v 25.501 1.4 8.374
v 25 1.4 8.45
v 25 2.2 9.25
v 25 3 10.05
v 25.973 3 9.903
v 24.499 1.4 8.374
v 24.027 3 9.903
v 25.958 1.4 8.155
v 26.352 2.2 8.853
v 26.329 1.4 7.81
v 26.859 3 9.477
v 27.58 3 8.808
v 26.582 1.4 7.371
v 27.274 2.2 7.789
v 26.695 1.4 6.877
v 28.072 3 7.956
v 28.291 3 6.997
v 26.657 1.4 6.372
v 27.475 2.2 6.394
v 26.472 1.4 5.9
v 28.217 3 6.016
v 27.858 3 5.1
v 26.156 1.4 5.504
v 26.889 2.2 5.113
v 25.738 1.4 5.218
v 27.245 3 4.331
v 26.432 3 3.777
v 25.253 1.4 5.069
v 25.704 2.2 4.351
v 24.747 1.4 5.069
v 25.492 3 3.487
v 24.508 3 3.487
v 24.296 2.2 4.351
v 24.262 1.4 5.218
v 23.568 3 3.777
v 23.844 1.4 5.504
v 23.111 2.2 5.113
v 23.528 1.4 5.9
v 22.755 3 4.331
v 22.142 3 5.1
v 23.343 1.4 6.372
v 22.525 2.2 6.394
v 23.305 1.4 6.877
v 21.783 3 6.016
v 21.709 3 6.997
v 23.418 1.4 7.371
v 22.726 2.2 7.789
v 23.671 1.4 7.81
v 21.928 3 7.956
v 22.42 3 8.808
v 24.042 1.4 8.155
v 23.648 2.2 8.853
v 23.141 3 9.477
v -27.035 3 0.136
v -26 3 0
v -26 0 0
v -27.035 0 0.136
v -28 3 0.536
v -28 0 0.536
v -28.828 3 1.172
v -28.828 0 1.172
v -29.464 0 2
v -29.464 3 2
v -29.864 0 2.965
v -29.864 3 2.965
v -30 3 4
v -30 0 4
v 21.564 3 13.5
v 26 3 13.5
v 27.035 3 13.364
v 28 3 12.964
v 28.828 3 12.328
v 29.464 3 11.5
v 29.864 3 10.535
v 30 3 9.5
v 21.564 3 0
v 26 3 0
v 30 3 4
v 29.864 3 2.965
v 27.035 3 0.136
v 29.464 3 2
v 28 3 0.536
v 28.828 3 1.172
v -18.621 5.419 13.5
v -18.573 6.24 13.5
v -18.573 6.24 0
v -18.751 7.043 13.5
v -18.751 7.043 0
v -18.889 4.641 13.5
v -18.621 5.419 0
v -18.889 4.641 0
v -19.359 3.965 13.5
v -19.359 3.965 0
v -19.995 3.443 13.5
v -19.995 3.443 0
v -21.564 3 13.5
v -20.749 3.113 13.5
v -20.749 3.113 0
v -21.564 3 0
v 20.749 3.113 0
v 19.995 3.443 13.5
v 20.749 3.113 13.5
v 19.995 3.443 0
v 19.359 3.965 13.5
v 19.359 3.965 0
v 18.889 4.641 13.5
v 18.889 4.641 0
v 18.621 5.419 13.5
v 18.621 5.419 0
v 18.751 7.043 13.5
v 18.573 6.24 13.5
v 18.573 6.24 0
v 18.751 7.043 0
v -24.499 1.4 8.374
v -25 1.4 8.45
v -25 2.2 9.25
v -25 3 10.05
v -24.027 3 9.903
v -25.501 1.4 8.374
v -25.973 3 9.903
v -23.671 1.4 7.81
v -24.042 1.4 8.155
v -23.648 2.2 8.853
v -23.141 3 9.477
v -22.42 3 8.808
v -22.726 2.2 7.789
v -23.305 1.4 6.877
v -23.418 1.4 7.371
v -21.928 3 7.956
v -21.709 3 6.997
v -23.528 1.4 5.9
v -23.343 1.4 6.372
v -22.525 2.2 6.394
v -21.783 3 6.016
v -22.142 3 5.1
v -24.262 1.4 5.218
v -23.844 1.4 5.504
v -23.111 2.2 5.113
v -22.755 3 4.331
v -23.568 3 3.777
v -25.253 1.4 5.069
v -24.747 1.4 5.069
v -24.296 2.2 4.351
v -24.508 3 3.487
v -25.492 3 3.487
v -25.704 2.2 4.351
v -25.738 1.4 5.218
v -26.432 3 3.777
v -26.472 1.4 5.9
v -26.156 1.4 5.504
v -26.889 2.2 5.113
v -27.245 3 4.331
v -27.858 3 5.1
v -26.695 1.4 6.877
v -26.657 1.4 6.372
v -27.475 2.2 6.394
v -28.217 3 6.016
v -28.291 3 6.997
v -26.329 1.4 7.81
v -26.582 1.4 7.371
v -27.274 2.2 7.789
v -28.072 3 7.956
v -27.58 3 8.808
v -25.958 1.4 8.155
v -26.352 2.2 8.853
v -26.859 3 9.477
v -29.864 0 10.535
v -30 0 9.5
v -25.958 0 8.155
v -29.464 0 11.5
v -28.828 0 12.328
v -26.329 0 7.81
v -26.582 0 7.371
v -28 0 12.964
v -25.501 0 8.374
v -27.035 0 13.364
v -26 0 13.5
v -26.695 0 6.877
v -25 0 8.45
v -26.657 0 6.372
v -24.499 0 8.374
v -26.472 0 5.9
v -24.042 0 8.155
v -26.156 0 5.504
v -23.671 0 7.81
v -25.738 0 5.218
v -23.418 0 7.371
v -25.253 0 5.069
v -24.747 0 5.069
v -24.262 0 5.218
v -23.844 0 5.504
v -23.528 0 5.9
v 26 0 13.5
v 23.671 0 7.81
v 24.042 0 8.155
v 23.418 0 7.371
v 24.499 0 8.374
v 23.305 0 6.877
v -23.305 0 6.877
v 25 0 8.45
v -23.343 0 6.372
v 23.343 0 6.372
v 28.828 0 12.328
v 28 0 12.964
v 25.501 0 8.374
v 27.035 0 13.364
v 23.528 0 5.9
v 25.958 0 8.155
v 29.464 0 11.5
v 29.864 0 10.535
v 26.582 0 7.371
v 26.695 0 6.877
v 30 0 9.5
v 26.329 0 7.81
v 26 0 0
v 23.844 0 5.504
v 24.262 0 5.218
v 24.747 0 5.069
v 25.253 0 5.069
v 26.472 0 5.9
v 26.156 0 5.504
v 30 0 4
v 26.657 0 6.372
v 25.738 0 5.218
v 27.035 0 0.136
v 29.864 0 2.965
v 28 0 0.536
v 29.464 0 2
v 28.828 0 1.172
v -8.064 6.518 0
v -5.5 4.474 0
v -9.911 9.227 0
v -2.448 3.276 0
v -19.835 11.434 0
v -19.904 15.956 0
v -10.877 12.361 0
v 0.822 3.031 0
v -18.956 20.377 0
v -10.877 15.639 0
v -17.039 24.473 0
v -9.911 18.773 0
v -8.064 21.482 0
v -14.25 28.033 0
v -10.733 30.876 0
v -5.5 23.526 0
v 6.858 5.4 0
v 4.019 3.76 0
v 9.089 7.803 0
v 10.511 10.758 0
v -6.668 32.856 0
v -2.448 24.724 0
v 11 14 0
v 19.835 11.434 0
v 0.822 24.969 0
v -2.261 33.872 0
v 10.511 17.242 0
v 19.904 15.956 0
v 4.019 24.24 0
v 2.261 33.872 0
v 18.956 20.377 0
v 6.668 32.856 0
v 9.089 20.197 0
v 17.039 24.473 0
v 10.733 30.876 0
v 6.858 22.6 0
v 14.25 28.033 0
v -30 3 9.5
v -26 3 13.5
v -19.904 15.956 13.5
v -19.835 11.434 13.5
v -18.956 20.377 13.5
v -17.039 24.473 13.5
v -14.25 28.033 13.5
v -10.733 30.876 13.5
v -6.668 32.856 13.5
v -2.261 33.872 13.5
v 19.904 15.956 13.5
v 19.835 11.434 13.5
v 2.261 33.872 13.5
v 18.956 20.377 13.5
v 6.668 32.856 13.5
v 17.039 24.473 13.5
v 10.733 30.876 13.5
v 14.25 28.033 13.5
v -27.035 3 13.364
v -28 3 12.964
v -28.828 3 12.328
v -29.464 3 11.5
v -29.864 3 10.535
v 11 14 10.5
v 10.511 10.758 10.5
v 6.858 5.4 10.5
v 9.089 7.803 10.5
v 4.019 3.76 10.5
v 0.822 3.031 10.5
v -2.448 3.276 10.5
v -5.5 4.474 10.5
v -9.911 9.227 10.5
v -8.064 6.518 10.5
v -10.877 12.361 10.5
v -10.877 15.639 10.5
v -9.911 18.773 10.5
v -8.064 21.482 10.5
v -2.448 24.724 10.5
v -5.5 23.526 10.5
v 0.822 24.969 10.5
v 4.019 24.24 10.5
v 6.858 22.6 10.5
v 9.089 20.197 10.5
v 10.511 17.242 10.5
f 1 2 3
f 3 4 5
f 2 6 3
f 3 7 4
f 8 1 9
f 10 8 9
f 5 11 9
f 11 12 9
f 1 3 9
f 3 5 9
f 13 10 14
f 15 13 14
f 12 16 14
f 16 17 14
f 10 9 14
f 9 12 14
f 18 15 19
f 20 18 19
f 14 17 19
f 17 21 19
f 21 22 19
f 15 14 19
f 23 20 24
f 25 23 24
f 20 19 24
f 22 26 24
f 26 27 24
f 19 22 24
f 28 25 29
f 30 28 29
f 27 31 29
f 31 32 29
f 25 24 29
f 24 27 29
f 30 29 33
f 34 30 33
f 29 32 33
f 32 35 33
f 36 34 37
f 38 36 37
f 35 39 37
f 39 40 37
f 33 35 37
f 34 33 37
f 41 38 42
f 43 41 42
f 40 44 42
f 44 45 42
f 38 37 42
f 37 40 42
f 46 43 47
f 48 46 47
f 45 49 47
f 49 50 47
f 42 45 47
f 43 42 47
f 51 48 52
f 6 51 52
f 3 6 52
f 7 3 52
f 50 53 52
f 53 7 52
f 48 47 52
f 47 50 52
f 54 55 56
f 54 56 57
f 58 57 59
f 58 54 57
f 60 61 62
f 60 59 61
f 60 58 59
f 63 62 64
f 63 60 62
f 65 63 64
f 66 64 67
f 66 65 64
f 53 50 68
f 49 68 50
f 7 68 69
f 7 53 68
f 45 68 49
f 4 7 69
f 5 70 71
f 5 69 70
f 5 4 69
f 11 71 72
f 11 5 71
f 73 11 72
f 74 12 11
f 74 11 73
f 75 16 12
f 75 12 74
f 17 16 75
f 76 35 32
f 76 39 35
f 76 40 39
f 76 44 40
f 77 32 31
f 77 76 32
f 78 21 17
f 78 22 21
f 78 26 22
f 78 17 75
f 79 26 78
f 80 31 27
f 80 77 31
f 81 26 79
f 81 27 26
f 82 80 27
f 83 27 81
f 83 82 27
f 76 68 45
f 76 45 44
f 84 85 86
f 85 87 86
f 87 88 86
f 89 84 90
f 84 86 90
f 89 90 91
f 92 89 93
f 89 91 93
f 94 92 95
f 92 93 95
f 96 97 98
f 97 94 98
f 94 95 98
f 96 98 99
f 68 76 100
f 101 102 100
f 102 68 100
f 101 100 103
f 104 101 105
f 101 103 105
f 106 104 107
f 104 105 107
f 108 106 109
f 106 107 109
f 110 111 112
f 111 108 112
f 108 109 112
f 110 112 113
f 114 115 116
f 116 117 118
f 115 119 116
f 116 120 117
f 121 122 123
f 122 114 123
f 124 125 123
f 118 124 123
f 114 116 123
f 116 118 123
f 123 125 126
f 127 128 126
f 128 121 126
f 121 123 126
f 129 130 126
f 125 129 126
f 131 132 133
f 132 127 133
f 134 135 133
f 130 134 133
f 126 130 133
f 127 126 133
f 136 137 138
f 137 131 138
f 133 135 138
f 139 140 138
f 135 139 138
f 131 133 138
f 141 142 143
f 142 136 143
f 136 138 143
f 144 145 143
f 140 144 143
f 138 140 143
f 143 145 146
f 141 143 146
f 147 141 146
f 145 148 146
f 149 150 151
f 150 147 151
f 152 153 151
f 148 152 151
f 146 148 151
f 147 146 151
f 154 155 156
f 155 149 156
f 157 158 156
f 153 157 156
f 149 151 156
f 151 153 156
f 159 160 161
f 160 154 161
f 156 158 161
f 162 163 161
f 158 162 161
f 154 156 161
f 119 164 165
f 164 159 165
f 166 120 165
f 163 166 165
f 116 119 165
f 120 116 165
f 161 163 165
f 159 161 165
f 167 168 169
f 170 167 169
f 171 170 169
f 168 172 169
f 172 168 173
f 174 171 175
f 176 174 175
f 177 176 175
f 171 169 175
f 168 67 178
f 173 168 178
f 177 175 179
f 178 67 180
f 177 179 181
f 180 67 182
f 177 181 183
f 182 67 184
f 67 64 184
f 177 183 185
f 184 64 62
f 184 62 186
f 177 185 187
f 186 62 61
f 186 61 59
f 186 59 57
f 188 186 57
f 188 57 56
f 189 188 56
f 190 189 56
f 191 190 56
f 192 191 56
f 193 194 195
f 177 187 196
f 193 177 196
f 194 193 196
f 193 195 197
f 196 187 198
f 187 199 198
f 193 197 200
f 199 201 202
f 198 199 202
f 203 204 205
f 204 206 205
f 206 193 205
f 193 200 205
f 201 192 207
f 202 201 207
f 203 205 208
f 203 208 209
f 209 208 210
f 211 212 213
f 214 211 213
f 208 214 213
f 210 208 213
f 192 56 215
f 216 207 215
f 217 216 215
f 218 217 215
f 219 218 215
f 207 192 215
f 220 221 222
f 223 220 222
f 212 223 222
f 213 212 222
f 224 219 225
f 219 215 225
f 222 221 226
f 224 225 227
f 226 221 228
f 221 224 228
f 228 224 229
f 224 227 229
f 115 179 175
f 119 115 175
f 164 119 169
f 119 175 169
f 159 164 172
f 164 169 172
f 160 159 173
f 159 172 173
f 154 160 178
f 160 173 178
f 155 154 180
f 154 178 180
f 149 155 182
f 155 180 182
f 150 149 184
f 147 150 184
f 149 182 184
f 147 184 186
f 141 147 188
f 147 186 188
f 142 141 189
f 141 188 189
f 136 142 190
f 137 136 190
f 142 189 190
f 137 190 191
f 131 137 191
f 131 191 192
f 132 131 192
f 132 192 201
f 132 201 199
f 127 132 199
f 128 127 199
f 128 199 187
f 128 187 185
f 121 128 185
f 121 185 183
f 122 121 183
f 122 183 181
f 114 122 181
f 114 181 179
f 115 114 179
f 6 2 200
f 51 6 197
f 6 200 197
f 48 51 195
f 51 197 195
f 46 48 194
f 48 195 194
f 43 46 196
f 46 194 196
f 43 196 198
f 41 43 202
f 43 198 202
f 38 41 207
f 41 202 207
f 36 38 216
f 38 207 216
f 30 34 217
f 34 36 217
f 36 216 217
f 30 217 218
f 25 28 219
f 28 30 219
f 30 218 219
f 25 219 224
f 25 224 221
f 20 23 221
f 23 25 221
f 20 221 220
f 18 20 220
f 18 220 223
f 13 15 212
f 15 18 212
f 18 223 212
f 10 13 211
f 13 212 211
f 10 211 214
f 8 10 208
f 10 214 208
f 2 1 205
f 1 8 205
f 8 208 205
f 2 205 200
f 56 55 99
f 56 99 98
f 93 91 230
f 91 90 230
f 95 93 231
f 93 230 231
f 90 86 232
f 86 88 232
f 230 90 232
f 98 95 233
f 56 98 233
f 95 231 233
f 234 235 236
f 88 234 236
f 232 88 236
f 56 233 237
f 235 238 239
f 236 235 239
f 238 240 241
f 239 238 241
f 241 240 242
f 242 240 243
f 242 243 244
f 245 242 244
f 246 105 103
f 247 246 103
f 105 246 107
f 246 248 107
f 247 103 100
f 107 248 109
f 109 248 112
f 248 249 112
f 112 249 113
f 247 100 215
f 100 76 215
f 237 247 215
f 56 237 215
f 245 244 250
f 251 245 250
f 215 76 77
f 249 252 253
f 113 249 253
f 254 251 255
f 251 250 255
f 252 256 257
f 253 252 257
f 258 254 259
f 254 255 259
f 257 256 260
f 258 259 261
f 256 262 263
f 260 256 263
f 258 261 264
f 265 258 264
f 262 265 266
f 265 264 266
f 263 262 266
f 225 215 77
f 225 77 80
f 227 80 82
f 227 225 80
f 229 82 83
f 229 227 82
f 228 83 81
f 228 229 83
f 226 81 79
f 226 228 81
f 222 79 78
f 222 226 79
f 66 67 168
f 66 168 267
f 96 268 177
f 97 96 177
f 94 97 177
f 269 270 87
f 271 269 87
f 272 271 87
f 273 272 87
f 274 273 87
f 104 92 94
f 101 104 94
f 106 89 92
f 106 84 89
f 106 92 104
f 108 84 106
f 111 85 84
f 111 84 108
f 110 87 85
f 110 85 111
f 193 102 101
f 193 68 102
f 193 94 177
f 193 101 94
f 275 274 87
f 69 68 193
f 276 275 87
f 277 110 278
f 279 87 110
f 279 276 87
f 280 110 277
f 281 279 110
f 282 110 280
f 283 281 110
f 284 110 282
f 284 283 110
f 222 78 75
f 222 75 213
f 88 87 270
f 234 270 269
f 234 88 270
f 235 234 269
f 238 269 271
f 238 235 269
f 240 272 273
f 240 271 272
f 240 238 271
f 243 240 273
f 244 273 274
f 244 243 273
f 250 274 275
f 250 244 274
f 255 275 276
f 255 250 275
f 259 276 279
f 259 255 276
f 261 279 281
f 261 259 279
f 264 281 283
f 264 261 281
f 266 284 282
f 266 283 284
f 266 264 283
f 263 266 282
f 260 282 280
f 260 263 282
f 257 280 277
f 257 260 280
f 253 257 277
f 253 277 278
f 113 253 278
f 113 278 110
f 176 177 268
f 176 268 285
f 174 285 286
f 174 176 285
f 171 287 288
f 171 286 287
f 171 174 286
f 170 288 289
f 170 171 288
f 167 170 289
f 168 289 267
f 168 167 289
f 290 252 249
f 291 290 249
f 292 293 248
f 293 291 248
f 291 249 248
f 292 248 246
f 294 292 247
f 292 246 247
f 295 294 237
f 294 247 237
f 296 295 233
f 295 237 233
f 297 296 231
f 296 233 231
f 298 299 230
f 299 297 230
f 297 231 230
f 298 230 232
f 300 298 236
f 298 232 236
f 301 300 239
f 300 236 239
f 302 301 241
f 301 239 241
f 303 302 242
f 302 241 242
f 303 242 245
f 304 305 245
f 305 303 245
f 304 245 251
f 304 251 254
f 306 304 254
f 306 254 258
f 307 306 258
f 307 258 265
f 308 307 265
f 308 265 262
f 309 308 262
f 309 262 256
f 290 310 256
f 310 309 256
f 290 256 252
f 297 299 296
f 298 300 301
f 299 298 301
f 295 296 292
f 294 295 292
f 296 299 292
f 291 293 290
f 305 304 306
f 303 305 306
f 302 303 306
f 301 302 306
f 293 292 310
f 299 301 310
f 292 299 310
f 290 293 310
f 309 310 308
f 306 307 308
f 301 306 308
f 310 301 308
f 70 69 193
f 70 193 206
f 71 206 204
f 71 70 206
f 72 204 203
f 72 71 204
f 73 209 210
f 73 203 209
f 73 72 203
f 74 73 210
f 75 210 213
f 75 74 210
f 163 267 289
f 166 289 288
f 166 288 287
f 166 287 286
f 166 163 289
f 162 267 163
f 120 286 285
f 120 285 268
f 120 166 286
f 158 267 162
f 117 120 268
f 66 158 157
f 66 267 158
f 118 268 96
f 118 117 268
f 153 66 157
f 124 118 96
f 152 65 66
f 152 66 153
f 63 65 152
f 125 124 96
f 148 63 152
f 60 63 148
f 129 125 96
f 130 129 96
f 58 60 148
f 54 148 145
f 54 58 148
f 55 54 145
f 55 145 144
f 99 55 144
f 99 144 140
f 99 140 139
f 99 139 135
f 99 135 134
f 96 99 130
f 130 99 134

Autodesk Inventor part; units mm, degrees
ref_plane "YZ Plane" through (0, 0, 0) normal (1, 0, 0) x (0, 1, 0)
ref_plane "XZ Plane" through (0, 0, 0) normal (0, 1, 0) x (-1, 0, 0)
ref_plane "XY Plane" through (0, 0, 0) normal (0, 0, 1) x (1, 0, 0)
sketch "Эскиз1" plane through (0, 0, 0) normal (0, 0, 1) x (1, 0, 0)
  line L0 (-30, 0) -> (30, 0)
  line L1 (-30, 0) -> (-30, 3)
  line L2 (-30, 3) -> (-16.7033, 3)
  line L3 (16.7033, 3) -> (30, 3)
  line L4 (30, 3) -> (30, 0)
  line L5 (0, 0) -> (0, -12) construction
  circle A0 centre (0, 14) radius 11 construction
  circle A1 centre (0, 14) radius 11
  arc A2 (16.7033, 3) -> (-16.7033, 3) centre (0, 14) ccw
  point P0 (0, 3)
  point P1 (0, 46)
  point P2 (0, 25)
  dimension "d3" = 3
  dimension "d8" = 22
  dimension "d9" = 14
  dimension "d25" = 40
  dimension "d39" = 30
extrude "Выдавливание1" add sketch "Эскиз1" along normal blind 10.5
sketch "Эскиз2" plane through (0, 0, 10.5) normal (0, 0, 1) x (1, 0, 0)
  line L0 (-30, 0) -> (30, 0) projected
  line L1 (30, 0) -> (30, 3) projected
  line L2 (30, 3) -> (16.7033, 3) projected
  line L3 (-16.7033, 3) -> (-30, 3) projected
  line L4 (-30, 3) -> (-30, 0) projected
  circle A0 centre (0, 14) radius 11 projected
  arc A1 (16.7033, 3) -> (-16.7033, 3) centre (0, 14) ccw projected
  point P0 (0, 0)
extrude "Выдавливание2" add sketch "Эскиз2" along normal blind 3 contours L4 L3 A1 L2 L1 L0 | A0
fillet "Сопряжение1" radius 4 4 edges at (30, 1.5, 0) (30, 1.5, 13.5) (-30, 1.5, 0) (-30, 1.5, 13.5)
fillet "Сопряжение1" radius 3 2 edges at (16.7033, 3, 6.75) (-16.7033, 3, 6.75)
sketch "Эскиз4" plane through (21.5639, 3, 0) normal (0, 1, 0) x (1, 0, 0)
  line L0 (-43.1277, 0) -> (-43.1277, -13.5) projected
  line L1 (-43.1277, 0) -> (-47.5639, 0) projected
  arc A0 (-47.5639, 0) -> (-51.5639, -4) centre (-47.5639, -4) ccw projected
  line L2 (-51.5639, -4) -> (-51.5639, -9.5) projected
  arc A1 (-51.5639, -9.5) -> (-47.5639, -13.5) centre (-47.5639, -9.5) ccw projected
  line L3 (-43.1277, -13.5) -> (-47.5639, -13.5) projected
  point P0 (-21.5639, 0)
  point P1 (-46.5639, -6.75)
  dimension "d29" = 5
  dimension "d30" = 6.75
hole "Отверстие2" at (-25, 3, 6.75) direction (0, -1, 0) diameter 3.4 depth 3.7 countersink diameter 6.6 countersink angle 90 clearance for "с потайной головкой ГОСТ 12876-67" size "M3" standard "ГОСТ"
mirror "Зеркальное отражение2" about plane through (0, 0, 0) normal (1, 0, 0) of "Отверстие2"
properties part number "корпус подшипник"
